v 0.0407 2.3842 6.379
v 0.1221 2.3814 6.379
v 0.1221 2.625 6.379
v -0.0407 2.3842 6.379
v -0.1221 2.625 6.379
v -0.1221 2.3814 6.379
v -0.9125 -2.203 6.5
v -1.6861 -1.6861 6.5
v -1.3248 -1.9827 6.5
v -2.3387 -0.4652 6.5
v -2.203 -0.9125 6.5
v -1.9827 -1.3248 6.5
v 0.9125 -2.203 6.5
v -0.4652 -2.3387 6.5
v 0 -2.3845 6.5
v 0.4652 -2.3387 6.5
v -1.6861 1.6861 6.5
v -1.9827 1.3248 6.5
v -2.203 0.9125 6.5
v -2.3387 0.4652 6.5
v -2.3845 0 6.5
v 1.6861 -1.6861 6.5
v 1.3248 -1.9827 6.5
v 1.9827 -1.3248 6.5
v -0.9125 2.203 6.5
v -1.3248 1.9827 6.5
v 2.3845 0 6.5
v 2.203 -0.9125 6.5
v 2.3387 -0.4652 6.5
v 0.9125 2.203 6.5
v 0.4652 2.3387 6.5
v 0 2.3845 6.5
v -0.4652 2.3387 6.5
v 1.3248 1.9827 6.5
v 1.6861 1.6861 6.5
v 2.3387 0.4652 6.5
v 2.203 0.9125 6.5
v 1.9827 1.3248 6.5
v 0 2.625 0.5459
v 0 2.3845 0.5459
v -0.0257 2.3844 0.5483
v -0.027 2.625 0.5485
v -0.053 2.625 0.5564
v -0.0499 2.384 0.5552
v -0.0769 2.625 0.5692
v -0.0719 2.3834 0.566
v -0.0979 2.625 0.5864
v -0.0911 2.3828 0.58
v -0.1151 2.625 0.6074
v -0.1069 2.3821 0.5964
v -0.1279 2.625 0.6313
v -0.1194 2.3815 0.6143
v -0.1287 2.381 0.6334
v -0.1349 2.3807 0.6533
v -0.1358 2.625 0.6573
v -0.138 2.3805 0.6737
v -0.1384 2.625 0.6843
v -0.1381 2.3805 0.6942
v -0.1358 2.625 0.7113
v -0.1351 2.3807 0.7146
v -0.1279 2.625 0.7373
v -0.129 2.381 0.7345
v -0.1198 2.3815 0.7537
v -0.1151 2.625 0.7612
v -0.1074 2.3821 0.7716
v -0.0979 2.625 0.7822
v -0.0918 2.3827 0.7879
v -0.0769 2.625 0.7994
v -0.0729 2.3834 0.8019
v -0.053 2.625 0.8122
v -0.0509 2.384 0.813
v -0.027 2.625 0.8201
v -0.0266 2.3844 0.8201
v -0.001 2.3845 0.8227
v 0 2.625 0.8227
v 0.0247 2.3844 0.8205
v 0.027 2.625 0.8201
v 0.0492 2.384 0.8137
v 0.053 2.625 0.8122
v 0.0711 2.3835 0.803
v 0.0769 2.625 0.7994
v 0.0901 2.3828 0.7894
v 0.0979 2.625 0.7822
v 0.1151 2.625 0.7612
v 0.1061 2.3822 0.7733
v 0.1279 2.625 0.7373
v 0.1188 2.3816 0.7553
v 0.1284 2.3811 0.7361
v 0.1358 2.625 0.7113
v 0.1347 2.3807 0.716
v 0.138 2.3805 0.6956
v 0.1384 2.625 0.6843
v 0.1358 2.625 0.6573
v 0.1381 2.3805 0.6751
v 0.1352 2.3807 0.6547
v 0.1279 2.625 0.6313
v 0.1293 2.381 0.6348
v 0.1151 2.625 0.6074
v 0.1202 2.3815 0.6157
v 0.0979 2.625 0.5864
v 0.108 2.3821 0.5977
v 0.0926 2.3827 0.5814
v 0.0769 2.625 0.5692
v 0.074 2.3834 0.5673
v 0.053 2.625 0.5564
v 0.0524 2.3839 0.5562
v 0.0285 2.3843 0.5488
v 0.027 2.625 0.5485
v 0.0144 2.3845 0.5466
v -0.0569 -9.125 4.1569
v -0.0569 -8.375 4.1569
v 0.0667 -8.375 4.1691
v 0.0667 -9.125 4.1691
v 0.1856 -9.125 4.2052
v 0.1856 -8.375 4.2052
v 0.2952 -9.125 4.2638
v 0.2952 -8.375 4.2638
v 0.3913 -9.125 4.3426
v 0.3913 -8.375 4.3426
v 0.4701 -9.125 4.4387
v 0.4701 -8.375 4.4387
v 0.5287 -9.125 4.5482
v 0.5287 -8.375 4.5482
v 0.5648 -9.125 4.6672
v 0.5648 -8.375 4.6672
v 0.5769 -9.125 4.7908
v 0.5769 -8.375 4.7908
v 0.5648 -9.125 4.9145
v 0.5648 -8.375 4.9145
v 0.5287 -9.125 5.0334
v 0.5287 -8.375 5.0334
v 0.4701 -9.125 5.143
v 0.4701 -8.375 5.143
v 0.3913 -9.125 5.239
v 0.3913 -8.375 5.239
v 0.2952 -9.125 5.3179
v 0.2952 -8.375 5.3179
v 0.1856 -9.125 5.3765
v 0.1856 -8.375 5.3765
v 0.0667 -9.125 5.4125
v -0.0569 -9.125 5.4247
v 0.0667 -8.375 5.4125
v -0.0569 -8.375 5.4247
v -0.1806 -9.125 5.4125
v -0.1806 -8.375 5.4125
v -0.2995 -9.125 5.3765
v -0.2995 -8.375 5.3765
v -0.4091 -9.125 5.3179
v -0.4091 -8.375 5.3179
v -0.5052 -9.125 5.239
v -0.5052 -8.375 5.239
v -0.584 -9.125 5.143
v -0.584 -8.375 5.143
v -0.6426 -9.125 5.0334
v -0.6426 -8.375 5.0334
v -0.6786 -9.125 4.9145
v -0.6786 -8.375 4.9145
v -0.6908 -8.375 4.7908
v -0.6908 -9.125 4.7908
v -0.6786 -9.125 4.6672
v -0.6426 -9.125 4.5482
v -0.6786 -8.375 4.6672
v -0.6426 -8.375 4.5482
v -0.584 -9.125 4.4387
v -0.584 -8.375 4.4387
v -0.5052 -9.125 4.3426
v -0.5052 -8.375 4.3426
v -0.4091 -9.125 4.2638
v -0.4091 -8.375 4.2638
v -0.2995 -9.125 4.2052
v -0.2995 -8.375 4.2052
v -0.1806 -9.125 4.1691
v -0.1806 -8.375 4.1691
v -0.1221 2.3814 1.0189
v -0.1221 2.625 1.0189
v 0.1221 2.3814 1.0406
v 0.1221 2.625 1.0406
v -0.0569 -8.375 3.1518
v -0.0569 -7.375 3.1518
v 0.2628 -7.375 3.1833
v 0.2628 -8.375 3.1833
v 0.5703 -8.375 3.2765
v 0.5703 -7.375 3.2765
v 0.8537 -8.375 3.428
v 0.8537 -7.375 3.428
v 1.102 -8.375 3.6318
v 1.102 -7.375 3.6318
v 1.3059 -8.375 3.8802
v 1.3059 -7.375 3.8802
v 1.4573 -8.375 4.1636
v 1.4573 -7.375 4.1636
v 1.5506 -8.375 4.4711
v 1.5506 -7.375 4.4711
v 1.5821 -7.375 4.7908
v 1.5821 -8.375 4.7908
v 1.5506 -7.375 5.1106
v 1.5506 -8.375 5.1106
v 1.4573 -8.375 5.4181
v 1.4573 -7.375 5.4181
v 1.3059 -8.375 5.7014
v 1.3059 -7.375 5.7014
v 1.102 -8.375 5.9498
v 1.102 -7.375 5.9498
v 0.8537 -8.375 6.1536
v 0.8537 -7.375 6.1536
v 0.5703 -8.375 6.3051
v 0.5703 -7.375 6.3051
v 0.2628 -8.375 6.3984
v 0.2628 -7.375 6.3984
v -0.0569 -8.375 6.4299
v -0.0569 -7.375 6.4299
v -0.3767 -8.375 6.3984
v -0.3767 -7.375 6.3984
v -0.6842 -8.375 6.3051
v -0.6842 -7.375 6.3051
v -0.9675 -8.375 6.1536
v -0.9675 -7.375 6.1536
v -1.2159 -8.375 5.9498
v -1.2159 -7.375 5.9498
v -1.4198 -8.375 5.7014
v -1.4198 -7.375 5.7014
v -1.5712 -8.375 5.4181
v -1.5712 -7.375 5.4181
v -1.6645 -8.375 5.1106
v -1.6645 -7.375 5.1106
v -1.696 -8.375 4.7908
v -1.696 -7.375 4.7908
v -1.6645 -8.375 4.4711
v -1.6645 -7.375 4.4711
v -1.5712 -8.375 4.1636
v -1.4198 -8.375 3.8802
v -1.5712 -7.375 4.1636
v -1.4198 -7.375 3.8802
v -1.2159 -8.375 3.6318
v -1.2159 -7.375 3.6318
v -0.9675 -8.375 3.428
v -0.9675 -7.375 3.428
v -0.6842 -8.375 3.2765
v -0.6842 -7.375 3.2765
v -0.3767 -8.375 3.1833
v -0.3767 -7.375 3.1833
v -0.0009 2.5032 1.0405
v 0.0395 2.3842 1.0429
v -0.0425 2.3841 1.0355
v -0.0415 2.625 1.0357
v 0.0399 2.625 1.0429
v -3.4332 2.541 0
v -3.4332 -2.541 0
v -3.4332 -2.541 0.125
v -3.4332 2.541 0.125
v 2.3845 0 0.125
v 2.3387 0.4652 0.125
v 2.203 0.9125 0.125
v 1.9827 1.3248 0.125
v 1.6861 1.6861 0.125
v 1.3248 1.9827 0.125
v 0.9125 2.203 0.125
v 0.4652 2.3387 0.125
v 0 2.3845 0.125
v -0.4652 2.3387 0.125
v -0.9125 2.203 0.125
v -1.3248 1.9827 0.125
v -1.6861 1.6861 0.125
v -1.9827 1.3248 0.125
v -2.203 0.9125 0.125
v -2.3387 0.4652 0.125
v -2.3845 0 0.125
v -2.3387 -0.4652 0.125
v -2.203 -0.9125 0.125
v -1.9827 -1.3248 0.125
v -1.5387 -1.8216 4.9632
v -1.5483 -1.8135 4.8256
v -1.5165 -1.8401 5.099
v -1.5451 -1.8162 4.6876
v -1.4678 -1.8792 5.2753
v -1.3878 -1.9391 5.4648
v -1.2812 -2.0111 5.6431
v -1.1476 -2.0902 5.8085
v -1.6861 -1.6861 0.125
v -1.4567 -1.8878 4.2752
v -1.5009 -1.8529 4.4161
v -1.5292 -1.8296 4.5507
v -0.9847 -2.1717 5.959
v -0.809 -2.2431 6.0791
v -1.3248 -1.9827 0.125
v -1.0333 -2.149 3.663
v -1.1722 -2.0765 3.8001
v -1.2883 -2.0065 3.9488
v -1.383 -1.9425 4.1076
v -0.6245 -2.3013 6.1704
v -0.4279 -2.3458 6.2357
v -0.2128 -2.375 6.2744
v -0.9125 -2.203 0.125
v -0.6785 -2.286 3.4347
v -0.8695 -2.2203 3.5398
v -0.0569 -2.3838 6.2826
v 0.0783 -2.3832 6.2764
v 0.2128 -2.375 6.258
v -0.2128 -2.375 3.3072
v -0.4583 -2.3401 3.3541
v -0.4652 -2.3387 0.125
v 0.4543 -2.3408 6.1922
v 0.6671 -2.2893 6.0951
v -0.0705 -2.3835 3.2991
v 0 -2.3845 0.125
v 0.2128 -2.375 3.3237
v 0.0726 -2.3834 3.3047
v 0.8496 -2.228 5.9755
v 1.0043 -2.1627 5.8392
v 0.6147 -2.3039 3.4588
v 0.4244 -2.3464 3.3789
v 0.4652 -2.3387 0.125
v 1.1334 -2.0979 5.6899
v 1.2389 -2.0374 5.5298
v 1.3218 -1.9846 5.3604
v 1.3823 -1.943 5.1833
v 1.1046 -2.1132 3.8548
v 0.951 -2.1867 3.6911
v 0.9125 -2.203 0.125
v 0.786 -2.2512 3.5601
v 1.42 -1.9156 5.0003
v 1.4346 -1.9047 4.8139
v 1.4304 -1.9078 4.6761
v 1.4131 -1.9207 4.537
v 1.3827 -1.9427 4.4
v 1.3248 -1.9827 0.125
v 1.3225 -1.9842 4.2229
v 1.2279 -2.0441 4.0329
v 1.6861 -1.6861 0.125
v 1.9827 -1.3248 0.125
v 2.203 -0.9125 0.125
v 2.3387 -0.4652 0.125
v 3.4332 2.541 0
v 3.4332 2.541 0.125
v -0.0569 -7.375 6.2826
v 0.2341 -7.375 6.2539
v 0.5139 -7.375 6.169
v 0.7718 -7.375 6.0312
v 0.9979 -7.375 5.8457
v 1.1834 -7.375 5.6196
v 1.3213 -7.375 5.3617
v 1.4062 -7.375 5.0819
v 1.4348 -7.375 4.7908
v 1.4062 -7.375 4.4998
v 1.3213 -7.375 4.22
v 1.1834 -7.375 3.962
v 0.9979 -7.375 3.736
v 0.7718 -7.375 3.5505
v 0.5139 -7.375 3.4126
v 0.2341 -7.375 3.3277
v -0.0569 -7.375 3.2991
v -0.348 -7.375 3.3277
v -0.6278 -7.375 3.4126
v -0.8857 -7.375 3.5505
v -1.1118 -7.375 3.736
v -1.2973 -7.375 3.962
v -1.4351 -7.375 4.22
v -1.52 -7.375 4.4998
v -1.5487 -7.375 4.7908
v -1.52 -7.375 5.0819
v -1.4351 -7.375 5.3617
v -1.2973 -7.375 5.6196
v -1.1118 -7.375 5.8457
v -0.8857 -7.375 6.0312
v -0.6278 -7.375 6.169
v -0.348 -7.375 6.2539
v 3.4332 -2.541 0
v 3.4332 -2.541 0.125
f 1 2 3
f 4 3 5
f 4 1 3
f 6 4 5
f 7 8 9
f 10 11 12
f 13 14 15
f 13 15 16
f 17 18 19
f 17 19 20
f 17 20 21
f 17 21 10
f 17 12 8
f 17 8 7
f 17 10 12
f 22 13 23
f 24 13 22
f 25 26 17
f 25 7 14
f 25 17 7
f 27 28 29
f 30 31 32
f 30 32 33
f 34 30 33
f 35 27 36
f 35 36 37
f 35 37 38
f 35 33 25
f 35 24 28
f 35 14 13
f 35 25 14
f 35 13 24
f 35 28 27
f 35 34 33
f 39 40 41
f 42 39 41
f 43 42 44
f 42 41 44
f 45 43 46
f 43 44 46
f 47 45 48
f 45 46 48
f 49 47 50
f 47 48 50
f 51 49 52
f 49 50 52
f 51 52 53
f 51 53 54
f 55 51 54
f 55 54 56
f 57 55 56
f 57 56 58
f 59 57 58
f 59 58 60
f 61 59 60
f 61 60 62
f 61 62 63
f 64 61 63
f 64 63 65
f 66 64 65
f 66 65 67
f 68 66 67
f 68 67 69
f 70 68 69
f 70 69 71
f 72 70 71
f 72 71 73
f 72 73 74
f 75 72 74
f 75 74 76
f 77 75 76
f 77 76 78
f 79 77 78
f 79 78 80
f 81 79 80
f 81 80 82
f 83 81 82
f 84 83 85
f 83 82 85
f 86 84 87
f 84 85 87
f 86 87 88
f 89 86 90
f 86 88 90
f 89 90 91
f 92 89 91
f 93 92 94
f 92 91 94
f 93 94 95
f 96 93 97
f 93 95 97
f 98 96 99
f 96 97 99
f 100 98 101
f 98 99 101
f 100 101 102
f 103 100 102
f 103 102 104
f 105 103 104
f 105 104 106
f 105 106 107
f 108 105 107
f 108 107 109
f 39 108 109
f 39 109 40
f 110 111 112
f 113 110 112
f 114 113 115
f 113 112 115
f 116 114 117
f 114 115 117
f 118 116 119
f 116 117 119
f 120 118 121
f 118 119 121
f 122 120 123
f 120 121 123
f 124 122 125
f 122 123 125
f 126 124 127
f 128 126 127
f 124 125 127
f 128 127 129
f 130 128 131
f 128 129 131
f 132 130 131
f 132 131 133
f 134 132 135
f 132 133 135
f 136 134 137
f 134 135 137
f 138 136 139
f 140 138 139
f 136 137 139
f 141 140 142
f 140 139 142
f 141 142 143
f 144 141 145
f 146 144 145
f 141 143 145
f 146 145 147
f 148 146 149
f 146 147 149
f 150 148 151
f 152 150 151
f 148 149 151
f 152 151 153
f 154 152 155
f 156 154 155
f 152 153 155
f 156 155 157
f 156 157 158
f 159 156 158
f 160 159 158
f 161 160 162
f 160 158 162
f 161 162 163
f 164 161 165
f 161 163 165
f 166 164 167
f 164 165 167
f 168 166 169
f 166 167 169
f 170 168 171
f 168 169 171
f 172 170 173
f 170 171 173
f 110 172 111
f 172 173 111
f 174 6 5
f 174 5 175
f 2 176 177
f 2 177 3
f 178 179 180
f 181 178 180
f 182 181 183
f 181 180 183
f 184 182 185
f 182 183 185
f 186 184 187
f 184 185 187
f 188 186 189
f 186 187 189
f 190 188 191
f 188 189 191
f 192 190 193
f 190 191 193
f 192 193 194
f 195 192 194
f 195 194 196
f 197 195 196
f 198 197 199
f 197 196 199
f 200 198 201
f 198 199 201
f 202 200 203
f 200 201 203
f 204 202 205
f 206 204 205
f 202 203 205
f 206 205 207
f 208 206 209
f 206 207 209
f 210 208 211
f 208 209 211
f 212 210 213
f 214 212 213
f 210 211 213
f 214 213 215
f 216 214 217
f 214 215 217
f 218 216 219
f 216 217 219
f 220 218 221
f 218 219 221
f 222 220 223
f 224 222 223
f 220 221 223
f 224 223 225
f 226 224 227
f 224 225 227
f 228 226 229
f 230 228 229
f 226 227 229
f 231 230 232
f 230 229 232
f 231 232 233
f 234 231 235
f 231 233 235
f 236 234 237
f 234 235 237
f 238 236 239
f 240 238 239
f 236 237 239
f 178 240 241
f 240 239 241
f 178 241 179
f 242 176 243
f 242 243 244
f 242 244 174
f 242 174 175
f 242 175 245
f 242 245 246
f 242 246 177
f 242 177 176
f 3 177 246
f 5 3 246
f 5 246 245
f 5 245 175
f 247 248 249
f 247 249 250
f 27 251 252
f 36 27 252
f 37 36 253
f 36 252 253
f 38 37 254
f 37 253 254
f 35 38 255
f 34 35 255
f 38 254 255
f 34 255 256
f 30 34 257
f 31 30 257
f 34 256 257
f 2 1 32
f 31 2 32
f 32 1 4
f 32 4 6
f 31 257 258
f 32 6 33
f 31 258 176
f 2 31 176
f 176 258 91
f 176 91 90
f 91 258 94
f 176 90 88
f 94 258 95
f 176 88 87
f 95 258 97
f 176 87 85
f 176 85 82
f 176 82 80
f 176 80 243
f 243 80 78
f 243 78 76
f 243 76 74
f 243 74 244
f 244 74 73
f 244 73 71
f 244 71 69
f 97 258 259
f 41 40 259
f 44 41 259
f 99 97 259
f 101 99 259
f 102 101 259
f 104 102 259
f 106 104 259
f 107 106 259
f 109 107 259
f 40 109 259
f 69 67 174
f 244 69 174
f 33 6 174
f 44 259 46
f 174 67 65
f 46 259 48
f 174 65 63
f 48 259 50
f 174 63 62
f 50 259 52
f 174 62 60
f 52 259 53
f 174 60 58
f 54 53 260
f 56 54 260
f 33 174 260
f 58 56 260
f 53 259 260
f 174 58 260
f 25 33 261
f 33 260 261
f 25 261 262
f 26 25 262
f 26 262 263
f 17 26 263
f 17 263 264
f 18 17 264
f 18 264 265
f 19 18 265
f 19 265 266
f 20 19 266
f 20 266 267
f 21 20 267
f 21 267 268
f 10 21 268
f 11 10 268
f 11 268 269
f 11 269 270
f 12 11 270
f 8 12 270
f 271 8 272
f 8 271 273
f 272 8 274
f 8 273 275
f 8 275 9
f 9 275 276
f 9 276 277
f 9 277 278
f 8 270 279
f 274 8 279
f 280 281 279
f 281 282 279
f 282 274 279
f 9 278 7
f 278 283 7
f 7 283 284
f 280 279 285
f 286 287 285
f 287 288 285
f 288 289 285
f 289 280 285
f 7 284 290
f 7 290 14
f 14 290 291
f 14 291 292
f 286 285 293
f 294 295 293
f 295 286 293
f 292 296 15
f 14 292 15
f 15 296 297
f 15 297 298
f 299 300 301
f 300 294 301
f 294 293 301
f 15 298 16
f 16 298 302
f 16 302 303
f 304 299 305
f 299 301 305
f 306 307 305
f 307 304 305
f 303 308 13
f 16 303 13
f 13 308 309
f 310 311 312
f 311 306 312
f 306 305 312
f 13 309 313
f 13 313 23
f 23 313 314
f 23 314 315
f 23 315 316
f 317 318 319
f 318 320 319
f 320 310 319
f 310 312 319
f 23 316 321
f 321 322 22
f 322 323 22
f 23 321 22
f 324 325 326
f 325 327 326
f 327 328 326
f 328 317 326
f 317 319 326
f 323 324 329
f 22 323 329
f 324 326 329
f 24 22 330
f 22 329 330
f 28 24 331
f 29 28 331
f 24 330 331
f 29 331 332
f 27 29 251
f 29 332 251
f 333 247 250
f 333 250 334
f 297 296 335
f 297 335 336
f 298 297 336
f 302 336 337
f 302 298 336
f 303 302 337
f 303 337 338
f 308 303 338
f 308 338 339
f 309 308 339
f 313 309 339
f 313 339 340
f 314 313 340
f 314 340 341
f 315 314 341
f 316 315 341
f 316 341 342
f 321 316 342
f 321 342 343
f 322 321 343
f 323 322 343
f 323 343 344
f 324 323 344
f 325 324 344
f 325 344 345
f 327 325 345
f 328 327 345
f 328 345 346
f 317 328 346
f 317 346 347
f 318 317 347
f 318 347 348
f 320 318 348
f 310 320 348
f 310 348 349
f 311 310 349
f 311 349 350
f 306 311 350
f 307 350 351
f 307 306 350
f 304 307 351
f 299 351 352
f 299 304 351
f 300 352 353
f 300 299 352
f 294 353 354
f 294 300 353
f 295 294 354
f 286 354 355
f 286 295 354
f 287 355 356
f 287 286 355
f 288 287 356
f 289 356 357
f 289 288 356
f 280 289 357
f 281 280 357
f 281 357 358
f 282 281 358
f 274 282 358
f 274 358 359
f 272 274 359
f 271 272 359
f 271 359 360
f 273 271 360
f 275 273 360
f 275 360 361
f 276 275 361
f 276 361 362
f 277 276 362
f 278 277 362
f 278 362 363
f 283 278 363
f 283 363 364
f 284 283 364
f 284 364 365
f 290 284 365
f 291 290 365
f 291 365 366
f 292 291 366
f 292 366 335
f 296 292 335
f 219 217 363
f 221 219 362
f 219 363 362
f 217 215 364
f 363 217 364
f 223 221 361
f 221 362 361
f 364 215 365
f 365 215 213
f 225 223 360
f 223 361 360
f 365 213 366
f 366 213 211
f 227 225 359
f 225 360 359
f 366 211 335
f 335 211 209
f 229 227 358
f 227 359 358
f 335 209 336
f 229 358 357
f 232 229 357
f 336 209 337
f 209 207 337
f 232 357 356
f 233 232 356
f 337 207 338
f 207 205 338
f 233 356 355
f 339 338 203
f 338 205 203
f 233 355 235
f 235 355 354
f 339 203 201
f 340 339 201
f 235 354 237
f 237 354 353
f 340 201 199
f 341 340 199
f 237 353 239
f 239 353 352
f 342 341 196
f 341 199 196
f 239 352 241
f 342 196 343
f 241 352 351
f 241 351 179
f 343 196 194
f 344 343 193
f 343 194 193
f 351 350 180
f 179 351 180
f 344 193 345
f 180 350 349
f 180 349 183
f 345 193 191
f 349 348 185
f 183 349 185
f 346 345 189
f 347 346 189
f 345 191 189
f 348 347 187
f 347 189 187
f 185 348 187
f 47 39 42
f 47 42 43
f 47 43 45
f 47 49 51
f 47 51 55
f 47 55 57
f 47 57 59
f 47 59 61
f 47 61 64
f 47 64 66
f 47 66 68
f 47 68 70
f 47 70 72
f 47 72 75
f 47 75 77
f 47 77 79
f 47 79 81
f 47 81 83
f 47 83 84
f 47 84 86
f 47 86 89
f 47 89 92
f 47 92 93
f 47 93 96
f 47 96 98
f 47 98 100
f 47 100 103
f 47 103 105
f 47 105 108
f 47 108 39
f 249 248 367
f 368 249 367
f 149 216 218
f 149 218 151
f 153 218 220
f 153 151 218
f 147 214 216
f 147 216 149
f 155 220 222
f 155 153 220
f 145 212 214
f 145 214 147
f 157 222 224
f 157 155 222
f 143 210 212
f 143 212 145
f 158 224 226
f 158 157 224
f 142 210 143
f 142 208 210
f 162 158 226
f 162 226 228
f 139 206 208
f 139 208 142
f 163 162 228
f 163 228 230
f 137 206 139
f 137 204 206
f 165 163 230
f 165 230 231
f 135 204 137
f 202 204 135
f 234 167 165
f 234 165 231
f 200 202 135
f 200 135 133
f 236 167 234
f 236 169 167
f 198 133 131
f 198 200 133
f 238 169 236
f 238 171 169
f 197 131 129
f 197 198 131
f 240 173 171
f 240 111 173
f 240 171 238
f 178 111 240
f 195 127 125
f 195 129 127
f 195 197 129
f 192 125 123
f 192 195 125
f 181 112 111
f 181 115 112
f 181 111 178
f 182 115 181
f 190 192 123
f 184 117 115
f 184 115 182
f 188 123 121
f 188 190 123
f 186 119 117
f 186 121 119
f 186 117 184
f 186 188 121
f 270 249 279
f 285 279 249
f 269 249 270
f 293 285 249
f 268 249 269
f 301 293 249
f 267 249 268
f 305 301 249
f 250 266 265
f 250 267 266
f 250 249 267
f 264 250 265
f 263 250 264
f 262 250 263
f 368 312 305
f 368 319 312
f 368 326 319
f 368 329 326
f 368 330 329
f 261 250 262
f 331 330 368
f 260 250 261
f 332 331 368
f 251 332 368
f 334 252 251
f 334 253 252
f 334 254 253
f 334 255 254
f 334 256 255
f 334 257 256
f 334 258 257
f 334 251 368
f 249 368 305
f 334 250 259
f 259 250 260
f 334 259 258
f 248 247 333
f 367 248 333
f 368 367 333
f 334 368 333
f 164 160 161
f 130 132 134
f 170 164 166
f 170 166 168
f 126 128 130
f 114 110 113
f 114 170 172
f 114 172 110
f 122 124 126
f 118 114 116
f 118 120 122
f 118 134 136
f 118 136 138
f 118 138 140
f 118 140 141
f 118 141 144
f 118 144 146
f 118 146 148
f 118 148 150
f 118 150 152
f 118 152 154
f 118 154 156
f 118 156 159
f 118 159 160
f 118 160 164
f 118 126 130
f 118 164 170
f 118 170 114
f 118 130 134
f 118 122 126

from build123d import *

# Parameters (mm, degrees)
SKETCH2_W           = 54.93072207
SKETCH2_H           = 40.655962058
BOSS_EXTRUDE1_DEPTH = 1
SKETCH3_R           = 19.076133807
BOSS_EXTRUDE2_DEPTH = 51
SKETCH4_R           = 11.934045709
BOSS_EXTRUDE3_DEPTH = 40
BOSS_EXTRUDE4_START = 10
SKETCH5_R           = 11.934045709
BOSS_EXTRUDE4_DEPTH = 10
SKETCH6_R           = 13.112340193
BOSS_EXTRUDE5_DEPTH = 8
SKETCH7_R           = 5.071080503
BOSS_EXTRUDE6_DEPTH = 6
SKETCH8_R           = 1.107443945
BOSS_EXTRUDE7_DEPTH = 2
SCALE1_SCALE        = 0.5
SCALE2_SCALE        = 0.5
SCALE3_SCALE        = 0.5


with BuildPart() as part:
    # Sketch2 → Boss-Extrude1 (new body)
    with BuildSketch(Plane.XY):
        Rectangle(SKETCH2_W, SKETCH2_H)
    extrude(amount=BOSS_EXTRUDE1_DEPTH)

    # Sketch3 → Boss-Extrude2 (add)
    with BuildSketch(Plane.XY.offset(1)):
        Circle(SKETCH3_R)
    extrude(amount=BOSS_EXTRUDE2_DEPTH)

    # Sketch4 → Boss-Extrude3 (add)
    with BuildSketch(Plane(origin=(0, -19, 0), x_dir=(1, 0, 0), z_dir=(0, 1, 0))):
        with Locations(Location((-0.455521122, -38.326598174, 0), (0, 0, 270))):
            Circle(SKETCH4_R)
    extrude(amount=-BOSS_EXTRUDE3_DEPTH)

    # Sketch5 → Boss-Extrude4 (add)
    with BuildSketch(Plane(origin=(0, -19, 0), x_dir=(1, 0, 0), z_dir=(0, 1, 0)).offset(BOSS_EXTRUDE4_START)):
        with Locations(Location((-0.455521122, -38.326598174, 0), (0, 0, 270))):
            Circle(SKETCH5_R)
    extrude(amount=-BOSS_EXTRUDE4_DEPTH)

    # Sketch6 → Boss-Extrude5 (add)
    with BuildSketch(Plane.XZ.offset(59)):
        with Locations(Location((-0.455521122, 38.326598174, 0), (0, 0, 270))):
            Circle(SKETCH6_R)
    extrude(amount=BOSS_EXTRUDE5_DEPTH)

    # Sketch7 → Boss-Extrude6 (add)
    with BuildSketch(Plane.XZ.offset(67)):
        with Locations(Location((-0.455521122, 38.326598174, 0), (0, 0, 270))):
            Circle(SKETCH7_R)
    extrude(amount=BOSS_EXTRUDE6_DEPTH)

    # Sketch8 → Boss-Extrude7 (add)
    with BuildSketch(Plane(origin=(0, 19, 0), x_dir=(1, 0, 0), z_dir=(0, 1, 0))):
        with BuildLine():
            add(Edge.make_bspline(
                [(-0.976975476, -8.151409565), (-0.015117663, -8.40988659), (0.976975476, -8.324614056)],
                knots=[0, 0, 0, 1, 1, 1], degree=2))
            Line((0.976975476, -8.324614056), (0.976975476, -51.031726638))
            Line((0.976975476, -51.031726638), (-0.976975476, -51.031726638))
            Line((-0.976975476, -51.031726638), (-0.976975476, -8.151409565))
        make_face()
        with Locations(Location((0, -5.474365912, 0), (0, 0, 90))):
            Circle(SKETCH8_R)
    extrude(amount=BOSS_EXTRUDE7_DEPTH)


with BuildPart() as part_1:
    # Scale1: scaled about (0, 0, 0)
    add(part.part.scale(SCALE1_SCALE))


with BuildPart() as part_2:
    # Scale2: scaled about (0, 0, 0)
    add(part_1.part.scale(SCALE2_SCALE))


with BuildPart() as part_3:
    # Scale3: scaled about (0, 0, 0)
    add(part_2.part.scale(SCALE3_SCALE))


solid = part_3.part
